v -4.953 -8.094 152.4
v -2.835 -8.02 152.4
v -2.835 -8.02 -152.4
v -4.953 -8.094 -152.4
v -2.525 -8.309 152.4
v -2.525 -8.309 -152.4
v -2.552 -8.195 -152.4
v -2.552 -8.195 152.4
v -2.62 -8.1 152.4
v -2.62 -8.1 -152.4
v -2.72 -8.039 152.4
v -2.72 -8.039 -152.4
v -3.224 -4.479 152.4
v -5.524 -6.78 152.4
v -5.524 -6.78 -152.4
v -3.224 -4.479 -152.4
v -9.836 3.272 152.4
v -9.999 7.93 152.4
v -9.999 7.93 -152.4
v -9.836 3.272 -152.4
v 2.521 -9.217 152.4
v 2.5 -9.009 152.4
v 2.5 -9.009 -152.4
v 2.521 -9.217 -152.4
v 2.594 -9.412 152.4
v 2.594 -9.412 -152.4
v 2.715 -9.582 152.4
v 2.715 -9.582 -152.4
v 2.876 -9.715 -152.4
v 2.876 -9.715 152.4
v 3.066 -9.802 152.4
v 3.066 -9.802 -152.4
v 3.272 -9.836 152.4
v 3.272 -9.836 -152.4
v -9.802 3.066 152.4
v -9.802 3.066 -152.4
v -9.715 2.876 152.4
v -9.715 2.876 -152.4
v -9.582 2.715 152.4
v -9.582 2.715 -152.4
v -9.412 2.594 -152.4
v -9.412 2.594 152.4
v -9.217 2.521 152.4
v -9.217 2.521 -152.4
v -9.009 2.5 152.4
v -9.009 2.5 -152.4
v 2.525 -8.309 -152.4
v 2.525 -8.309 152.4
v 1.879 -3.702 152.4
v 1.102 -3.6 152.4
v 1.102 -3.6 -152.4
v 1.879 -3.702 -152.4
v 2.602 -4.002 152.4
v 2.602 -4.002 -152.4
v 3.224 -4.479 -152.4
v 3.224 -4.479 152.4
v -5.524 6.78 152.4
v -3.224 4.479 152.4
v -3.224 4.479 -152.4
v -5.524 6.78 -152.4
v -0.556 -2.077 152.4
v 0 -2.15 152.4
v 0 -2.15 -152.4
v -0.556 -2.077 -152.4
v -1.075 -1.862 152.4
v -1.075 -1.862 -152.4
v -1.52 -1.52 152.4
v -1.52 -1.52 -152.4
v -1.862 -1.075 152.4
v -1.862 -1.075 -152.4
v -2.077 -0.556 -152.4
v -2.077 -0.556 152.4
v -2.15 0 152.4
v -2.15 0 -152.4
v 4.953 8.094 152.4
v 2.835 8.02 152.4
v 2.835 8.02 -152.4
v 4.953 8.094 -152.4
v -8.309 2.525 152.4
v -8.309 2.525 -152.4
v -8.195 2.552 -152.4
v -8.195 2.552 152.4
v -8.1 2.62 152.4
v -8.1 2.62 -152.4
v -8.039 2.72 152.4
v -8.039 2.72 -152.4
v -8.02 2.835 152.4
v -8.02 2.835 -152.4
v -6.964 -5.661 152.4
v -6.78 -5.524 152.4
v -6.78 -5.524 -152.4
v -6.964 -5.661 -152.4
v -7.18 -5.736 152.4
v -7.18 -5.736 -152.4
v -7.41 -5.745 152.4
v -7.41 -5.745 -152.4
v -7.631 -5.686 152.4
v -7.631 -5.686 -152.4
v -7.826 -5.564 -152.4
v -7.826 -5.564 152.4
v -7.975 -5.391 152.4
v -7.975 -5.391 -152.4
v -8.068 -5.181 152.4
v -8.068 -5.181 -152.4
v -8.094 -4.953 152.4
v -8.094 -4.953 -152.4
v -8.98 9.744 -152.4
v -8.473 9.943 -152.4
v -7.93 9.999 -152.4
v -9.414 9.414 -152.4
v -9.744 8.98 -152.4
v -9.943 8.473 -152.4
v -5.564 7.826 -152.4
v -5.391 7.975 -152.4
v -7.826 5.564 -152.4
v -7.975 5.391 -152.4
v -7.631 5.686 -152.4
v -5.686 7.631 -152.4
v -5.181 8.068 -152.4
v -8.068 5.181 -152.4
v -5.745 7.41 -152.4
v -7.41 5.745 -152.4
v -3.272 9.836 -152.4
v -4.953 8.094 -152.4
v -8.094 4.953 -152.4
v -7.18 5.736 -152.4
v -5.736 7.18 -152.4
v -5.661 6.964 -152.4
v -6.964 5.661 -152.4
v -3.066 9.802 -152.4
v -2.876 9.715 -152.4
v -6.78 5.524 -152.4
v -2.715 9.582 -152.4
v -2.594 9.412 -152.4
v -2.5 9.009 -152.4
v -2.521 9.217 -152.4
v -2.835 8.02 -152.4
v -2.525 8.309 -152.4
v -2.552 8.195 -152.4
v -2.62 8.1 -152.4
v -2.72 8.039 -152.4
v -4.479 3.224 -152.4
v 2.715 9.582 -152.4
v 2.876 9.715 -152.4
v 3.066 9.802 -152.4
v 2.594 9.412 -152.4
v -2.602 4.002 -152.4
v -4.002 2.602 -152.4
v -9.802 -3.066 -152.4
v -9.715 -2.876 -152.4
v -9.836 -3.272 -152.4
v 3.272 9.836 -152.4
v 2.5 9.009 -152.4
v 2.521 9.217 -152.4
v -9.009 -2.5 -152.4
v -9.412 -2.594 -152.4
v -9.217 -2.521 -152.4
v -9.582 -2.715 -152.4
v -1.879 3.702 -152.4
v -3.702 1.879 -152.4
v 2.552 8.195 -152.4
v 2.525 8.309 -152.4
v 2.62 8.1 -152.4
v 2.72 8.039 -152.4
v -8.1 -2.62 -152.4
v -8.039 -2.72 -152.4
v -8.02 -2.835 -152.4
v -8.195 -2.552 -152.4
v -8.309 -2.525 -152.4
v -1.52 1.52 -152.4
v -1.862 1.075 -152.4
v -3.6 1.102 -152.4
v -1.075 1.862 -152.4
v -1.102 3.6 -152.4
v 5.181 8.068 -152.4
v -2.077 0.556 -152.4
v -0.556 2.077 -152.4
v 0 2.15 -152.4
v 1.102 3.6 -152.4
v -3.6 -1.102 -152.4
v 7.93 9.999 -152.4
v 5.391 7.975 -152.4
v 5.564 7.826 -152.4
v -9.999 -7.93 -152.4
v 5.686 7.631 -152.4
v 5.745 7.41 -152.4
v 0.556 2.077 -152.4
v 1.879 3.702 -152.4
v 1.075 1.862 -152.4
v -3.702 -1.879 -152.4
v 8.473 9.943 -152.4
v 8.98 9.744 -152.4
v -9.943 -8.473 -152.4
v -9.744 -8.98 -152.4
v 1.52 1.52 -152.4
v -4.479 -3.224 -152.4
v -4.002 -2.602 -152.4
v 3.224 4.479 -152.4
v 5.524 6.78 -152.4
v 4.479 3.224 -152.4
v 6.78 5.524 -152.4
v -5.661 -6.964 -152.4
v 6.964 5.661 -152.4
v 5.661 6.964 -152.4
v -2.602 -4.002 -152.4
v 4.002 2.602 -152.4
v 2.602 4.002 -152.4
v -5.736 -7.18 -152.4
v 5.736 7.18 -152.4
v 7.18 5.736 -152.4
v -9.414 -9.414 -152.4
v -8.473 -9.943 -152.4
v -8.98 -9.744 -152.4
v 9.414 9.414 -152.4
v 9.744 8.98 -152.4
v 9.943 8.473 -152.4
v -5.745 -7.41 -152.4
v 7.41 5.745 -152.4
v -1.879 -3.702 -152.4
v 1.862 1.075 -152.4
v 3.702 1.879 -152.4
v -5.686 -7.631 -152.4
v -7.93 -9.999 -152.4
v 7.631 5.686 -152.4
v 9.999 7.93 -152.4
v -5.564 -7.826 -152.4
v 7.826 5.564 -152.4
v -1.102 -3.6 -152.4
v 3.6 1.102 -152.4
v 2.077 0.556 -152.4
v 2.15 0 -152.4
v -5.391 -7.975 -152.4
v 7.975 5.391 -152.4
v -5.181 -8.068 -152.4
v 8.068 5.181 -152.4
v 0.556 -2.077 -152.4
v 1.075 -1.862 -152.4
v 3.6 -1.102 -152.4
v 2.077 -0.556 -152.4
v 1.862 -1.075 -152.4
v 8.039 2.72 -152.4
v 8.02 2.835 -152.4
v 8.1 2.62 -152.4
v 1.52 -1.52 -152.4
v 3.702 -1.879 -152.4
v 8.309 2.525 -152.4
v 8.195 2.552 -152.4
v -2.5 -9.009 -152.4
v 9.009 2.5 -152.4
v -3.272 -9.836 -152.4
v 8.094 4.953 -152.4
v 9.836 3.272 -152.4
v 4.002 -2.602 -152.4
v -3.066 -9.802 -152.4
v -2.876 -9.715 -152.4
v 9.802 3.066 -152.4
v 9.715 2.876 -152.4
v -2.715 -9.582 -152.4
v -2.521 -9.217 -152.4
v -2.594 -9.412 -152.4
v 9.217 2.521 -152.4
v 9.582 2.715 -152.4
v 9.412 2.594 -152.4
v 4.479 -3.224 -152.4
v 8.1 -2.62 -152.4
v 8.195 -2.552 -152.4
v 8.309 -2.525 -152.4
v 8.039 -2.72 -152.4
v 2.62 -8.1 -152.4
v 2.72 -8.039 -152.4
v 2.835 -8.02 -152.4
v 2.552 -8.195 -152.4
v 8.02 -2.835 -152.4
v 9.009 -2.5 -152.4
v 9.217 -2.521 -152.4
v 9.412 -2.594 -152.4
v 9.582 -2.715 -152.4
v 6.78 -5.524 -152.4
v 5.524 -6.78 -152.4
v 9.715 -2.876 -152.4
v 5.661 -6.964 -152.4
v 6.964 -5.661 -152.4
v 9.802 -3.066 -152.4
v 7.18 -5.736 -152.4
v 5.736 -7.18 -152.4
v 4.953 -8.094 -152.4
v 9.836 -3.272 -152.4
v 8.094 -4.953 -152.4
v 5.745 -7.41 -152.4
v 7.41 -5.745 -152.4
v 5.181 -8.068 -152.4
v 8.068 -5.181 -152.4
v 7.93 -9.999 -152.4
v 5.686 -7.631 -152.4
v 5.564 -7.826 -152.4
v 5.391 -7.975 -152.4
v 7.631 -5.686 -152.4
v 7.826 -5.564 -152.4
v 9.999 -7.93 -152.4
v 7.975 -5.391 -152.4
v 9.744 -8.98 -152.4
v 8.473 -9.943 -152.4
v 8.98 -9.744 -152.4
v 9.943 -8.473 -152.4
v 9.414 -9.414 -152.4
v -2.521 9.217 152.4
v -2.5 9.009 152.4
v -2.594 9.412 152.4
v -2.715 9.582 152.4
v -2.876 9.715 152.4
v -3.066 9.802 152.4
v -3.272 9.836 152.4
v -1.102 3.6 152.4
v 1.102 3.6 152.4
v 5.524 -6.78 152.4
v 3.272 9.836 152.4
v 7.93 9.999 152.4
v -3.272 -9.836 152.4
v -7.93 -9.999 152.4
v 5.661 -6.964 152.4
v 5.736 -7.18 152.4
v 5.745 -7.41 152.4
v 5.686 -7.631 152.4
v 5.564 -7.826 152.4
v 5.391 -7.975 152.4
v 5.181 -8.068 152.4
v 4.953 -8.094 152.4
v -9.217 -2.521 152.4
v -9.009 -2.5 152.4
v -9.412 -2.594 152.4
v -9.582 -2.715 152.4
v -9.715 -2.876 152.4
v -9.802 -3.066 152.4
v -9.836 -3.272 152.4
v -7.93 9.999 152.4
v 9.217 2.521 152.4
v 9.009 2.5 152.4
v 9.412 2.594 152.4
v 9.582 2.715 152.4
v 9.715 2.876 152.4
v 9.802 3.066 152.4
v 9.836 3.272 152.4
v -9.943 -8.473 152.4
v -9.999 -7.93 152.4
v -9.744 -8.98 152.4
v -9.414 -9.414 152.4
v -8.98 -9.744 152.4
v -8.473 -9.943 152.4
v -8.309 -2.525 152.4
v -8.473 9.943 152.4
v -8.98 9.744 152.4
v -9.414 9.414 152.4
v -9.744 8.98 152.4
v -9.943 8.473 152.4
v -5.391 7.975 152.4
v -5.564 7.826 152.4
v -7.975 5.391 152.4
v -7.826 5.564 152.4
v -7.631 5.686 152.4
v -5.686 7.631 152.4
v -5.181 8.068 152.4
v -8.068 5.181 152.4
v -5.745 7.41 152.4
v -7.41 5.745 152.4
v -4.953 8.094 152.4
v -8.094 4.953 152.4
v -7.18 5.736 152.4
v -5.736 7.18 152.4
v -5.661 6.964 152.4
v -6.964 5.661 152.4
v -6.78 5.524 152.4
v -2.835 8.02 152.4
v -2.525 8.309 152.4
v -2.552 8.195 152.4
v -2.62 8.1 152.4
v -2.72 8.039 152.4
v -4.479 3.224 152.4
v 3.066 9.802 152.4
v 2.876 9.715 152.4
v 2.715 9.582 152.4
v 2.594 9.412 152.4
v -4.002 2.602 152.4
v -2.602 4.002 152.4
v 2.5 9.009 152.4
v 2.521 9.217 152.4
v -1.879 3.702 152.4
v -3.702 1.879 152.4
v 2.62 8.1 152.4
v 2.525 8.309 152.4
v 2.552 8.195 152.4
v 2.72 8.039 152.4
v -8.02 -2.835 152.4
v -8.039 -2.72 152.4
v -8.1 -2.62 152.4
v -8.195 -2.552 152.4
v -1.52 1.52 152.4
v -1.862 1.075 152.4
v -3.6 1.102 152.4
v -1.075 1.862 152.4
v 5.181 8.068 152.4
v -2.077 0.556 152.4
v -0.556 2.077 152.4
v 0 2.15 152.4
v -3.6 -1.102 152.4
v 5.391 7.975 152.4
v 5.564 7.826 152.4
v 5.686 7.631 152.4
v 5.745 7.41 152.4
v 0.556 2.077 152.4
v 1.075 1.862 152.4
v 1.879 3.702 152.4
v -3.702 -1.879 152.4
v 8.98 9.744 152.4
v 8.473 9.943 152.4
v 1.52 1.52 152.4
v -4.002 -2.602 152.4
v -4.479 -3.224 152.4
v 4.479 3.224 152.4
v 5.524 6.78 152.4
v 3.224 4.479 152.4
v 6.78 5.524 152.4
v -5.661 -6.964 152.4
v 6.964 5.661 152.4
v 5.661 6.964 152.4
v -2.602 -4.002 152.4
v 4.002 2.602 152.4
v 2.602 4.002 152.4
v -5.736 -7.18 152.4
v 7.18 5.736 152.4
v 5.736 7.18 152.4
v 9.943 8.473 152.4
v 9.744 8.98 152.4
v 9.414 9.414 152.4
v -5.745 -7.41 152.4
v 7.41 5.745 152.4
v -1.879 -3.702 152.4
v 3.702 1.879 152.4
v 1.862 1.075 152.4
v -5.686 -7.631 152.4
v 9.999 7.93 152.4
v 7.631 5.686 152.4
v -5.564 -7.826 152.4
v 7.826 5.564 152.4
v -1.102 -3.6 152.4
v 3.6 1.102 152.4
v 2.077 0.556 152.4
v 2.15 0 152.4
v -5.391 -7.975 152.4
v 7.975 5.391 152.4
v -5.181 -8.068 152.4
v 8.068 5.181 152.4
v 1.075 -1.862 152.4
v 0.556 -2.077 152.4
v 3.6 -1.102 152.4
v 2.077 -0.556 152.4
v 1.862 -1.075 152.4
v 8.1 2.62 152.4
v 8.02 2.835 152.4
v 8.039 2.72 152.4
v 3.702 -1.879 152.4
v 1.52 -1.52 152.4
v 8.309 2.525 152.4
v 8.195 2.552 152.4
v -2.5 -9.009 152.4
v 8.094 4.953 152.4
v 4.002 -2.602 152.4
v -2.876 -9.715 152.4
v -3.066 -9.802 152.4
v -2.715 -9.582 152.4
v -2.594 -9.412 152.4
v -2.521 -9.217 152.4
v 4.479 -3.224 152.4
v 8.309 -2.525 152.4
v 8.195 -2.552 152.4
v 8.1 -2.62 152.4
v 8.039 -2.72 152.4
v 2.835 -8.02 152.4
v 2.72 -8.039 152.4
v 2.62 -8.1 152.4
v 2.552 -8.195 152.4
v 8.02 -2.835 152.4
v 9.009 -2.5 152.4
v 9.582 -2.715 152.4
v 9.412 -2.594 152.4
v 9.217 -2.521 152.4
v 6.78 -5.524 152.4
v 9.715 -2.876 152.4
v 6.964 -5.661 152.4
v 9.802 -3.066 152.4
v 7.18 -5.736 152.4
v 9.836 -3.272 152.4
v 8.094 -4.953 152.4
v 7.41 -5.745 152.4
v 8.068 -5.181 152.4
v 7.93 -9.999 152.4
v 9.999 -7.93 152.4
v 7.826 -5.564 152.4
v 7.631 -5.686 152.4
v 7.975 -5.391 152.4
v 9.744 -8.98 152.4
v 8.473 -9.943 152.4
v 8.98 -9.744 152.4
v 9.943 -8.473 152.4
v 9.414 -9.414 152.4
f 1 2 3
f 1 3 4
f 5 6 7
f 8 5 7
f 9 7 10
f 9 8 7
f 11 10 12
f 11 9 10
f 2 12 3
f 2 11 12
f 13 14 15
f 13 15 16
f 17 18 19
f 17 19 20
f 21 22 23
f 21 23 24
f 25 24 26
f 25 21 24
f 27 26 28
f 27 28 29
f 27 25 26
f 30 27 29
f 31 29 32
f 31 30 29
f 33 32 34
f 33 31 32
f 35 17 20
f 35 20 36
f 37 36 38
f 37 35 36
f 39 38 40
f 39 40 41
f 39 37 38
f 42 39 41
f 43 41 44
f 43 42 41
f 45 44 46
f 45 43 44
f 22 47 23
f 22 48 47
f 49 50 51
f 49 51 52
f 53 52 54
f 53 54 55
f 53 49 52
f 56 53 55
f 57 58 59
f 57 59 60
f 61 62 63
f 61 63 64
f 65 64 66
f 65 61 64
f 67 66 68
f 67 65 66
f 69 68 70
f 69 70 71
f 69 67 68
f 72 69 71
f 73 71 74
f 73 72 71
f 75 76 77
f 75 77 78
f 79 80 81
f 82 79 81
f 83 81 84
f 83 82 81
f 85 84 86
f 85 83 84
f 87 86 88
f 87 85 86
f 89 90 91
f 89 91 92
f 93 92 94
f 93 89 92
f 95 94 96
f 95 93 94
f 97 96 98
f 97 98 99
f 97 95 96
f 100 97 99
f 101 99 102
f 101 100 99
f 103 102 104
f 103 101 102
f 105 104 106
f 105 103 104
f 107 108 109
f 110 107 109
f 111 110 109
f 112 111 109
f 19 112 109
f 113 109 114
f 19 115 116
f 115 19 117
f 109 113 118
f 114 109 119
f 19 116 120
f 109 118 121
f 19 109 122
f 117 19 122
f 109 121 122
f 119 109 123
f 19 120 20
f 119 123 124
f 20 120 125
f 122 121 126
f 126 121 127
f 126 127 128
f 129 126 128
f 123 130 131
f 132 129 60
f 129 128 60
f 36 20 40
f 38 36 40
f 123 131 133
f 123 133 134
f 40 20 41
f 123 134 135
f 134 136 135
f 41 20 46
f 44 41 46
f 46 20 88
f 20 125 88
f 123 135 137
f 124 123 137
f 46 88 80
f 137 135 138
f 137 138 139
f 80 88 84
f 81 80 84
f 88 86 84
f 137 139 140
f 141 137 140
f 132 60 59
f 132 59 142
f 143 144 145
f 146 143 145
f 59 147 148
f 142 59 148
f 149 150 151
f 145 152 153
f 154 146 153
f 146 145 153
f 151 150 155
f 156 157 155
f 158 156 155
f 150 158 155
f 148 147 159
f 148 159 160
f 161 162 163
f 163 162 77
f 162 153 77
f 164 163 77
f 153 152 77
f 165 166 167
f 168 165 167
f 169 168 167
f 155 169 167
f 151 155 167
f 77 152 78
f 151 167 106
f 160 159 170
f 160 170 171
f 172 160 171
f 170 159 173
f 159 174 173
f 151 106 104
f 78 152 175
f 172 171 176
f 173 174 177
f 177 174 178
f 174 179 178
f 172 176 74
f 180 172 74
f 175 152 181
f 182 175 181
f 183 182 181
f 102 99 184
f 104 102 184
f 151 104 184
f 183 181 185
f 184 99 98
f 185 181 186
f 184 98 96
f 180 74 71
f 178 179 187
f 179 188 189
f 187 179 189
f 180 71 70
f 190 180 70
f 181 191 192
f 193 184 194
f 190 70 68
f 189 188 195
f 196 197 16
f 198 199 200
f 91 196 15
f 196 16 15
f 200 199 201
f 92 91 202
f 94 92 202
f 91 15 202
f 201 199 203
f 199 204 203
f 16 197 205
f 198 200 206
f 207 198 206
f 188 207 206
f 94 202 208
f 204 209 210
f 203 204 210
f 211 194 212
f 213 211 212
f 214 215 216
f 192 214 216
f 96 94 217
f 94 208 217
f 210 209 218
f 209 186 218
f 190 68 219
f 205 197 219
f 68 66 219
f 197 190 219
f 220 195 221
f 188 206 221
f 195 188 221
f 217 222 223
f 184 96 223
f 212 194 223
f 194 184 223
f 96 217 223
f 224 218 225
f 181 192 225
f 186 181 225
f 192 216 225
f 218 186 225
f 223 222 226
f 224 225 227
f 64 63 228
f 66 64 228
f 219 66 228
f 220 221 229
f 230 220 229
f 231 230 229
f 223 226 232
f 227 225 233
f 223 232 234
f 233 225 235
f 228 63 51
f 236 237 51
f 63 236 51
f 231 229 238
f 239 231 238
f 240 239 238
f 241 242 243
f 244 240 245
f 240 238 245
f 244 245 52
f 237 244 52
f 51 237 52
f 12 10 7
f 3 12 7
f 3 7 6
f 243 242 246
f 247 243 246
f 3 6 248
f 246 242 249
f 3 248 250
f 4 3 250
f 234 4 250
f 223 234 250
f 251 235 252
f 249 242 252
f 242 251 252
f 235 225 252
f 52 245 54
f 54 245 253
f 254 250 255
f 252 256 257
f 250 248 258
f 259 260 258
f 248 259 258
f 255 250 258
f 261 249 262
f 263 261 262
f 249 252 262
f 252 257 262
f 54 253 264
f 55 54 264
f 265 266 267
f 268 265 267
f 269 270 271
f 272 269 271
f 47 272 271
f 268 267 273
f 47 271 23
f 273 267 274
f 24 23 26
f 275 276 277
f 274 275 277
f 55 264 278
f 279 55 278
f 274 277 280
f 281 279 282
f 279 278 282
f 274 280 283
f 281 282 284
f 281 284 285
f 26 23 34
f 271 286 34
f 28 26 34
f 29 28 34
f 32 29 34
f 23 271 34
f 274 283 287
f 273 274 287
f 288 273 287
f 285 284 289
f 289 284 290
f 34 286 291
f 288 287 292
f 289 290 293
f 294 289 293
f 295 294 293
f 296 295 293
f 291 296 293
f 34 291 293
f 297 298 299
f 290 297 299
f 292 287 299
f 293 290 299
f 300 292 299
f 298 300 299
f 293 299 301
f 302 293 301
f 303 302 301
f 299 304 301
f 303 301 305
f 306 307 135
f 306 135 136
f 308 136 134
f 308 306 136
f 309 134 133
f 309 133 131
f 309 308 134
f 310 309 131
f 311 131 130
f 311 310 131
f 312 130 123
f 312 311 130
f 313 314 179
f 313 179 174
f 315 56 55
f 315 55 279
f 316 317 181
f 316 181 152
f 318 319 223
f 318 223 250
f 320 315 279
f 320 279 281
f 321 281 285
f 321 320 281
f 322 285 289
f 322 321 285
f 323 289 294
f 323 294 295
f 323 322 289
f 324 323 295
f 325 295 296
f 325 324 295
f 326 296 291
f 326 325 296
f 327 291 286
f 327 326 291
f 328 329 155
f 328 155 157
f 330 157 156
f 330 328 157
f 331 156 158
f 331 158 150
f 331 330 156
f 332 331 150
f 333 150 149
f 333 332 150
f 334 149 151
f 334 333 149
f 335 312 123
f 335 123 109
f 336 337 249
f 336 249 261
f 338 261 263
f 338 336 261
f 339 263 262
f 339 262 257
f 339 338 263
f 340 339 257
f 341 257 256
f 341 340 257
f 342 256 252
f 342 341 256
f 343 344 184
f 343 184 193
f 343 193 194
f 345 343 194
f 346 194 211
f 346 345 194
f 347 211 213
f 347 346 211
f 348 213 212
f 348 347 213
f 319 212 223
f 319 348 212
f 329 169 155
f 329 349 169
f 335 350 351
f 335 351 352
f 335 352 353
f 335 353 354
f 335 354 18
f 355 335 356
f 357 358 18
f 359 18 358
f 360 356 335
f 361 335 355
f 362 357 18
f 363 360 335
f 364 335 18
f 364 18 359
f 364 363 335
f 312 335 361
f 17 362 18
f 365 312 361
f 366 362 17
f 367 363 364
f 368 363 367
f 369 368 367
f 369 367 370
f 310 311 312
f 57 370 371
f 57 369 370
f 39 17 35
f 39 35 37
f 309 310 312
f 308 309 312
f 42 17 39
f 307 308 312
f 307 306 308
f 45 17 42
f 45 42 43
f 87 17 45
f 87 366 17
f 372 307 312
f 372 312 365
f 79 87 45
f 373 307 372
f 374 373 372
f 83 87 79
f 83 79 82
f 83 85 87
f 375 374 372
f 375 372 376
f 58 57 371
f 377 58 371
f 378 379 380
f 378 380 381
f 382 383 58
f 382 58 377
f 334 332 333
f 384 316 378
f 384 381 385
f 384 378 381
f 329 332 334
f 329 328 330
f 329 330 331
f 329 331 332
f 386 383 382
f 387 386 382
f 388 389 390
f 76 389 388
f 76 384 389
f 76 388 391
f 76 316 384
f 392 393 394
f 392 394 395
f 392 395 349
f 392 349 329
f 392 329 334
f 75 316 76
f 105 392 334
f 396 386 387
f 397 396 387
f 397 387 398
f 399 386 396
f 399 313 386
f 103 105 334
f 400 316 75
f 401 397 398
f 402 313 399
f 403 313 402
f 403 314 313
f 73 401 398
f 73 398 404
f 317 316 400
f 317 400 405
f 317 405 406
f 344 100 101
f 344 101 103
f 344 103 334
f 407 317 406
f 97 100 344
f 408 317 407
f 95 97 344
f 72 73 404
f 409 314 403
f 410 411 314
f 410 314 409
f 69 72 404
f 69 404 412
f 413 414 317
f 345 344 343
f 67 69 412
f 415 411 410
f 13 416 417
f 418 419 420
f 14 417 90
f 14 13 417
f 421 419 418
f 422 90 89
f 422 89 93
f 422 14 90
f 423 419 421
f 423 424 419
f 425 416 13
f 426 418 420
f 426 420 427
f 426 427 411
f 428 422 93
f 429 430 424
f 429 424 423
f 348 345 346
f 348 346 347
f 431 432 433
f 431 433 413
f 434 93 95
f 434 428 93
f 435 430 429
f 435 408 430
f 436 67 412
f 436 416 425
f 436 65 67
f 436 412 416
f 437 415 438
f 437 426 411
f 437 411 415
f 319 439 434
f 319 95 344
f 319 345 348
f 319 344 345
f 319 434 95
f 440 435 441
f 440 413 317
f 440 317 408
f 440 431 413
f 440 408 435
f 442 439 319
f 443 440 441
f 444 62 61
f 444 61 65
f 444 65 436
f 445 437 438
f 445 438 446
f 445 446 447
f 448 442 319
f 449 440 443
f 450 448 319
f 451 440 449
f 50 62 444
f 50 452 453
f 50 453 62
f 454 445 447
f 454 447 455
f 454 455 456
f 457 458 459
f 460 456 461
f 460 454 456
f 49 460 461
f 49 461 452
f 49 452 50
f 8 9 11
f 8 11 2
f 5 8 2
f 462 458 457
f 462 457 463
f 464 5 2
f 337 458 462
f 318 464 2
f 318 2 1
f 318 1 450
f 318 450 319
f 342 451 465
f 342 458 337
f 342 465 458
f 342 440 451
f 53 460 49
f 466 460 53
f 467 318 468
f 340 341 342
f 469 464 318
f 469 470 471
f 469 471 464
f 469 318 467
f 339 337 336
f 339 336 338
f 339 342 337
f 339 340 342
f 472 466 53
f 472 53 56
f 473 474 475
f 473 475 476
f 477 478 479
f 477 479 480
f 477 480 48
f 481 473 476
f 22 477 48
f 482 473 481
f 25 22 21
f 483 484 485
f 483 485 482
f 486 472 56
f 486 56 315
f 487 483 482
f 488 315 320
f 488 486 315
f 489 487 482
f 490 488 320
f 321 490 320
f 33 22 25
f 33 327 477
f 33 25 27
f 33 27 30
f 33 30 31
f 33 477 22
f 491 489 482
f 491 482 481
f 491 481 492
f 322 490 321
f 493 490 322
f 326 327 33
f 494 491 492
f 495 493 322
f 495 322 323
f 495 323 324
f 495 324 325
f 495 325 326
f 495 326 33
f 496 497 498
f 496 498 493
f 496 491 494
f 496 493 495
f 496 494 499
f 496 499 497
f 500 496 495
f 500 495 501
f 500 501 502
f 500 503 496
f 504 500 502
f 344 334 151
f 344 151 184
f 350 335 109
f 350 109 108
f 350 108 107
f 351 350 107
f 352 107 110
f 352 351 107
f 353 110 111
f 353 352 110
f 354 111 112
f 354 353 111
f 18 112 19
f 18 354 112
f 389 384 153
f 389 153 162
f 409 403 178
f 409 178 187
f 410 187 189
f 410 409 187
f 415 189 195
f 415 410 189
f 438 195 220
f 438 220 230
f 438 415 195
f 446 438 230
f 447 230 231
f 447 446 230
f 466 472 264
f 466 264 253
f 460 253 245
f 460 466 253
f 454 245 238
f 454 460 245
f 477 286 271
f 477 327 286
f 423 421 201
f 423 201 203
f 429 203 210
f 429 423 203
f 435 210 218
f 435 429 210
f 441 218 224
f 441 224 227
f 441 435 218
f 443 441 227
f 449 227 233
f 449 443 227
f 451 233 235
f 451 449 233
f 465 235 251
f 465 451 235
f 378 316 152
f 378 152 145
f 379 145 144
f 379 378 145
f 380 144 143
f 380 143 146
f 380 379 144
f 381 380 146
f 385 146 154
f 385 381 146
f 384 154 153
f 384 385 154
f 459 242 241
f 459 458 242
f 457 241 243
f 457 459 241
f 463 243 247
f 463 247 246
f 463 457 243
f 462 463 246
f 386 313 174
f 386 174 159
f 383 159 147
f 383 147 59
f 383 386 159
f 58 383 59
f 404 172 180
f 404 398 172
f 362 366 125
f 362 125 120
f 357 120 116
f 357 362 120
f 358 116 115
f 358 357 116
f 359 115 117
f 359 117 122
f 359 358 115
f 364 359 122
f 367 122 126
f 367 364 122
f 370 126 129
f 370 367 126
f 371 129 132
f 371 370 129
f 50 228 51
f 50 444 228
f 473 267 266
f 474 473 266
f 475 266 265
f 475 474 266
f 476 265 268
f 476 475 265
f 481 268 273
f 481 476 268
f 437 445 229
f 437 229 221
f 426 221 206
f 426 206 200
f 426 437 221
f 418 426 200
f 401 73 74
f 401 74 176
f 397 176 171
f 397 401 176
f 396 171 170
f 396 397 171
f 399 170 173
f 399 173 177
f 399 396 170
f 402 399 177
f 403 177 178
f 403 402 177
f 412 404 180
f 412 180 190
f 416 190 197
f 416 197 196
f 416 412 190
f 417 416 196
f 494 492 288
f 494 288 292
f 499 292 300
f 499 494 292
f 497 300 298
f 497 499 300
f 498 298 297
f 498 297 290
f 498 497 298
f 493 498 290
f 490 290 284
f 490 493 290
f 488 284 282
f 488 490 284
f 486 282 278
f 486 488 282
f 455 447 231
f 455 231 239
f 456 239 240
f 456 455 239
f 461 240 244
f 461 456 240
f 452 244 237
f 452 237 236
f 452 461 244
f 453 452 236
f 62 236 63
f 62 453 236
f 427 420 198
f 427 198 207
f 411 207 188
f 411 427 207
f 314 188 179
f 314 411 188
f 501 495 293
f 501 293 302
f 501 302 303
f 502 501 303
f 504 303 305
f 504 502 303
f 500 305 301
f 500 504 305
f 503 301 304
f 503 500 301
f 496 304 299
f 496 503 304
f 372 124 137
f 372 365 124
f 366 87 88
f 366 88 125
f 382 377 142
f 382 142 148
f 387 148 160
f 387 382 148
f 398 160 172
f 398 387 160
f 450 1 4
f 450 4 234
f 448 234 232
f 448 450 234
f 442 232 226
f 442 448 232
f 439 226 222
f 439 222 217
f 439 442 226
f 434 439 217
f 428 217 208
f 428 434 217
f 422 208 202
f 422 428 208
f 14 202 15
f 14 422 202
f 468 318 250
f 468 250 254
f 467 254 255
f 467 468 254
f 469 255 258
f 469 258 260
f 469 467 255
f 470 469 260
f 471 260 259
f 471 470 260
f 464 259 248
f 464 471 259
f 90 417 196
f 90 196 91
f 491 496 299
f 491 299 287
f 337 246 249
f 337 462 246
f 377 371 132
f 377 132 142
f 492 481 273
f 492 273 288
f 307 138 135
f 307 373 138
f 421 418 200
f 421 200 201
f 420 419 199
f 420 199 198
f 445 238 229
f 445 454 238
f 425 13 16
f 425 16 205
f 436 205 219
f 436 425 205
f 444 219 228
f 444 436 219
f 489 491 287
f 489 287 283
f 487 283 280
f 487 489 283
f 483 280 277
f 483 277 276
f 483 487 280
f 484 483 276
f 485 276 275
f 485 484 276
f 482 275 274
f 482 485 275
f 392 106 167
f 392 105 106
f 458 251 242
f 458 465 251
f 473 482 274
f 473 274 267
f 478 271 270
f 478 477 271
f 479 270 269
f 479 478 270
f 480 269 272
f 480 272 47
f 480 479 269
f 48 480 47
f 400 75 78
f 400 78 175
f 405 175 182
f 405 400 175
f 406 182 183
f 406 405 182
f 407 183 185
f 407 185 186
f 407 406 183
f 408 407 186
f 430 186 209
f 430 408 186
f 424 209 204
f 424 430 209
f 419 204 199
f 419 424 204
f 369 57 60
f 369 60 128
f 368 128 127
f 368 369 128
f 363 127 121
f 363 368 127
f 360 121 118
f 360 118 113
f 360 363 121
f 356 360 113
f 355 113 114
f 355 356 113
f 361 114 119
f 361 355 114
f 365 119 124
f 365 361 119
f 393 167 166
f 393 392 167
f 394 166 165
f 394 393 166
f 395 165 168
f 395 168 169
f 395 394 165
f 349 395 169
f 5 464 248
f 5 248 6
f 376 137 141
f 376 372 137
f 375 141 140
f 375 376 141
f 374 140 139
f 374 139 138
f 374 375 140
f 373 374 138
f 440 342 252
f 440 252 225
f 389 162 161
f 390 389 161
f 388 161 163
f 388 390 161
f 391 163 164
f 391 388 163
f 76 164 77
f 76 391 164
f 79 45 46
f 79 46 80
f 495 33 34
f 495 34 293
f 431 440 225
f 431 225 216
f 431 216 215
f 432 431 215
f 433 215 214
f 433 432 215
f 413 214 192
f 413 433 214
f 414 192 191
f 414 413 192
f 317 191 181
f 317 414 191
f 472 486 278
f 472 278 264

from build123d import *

# Parameters (mm, degrees)
BOSS_EXTRUDE1_DEPTH = 152.4
CIRPATTERN1_COUNT   = 4


with BuildPart() as part:
    # Sketch3 → Boss-Extrude1 (new body, symmetric)
    with BuildSketch(Plane.XY):
        with BuildLine():
            Line((-2.524916986, 8.30911066), (-2.500487338, 9.008684239))
            ThreePointArc((-2.500487338, 9.008684239), (-2.714917039, 9.582202525), (-3.272080403, 9.836116498))
            Line((-3.272080403, 9.836116498), (-7.930201007, 9.998781654))
            ThreePointArc((-7.930201007, 9.998781654), (-9.414213562, 9.414213562), (-9.998781654, 7.930201007))
            Line((-9.998781654, 7.930201007), (-9.836116498, 3.272080403))
            ThreePointArc((-9.836116498, 3.272080403), (-9.582202525, 2.714917039), (-9.008684239, 2.500487338))
            Line((-9.008684239, 2.500487338), (-8.30911066, 2.524916986))
            ThreePointArc((-8.30911066, 2.524916986), (-8.100174399, 2.620134726), (-8.019763261, 2.835204083))
            Line((-8.019763261, 2.835204083), (-8.093719461, 4.953032548))
            ThreePointArc((-8.093719461, 4.953032548), (-7.631170264, 5.686128657), (-6.779559917, 5.52444538))
            Line((-6.779559917, 5.52444538), (-4.478679656, 3.22356512))
            ThreePointArc((-4.478679656, 3.22356512), (-3.828361402, 2.250295073), (-3.6, 1.102244776))
            Line((-3.6, 1.102244776), (-3.6, 0))
            Line((-3.6, 0), (-2.15, 0))
            ThreePointArc((-2.15, 0), (-1.52027958, 1.52027958), (0, 2.15))
            Line((0, 2.15), (0, 3.6))
            Line((0, 3.6), (-1.102244776, 3.6))
            ThreePointArc((-1.102244776, 3.6), (-2.250295073, 3.828361402), (-3.22356512, 4.478679656))
            Line((-3.22356512, 4.478679656), (-5.52444538, 6.779559917))
            ThreePointArc((-5.52444538, 6.779559917), (-5.686128657, 7.631170264), (-4.953032548, 8.093719461))
            Line((-4.953032548, 8.093719461), (-2.835204083, 8.019763261))
            ThreePointArc((-2.835204083, 8.019763261), (-2.620134726, 8.100174399), (-2.524916986, 8.30911066))
        make_face()
    boss_extrude1 = extrude(amount=BOSS_EXTRUDE1_DEPTH, both=True)

    # CirPattern1: Boss-Extrude1 ×4 about axis
    cirpattern1_axis = Axis((0, 0, 0), (0, 0, 1))
    for i in range(1, CIRPATTERN1_COUNT):
        add(boss_extrude1.rotate(cirpattern1_axis, i * 360 / CIRPATTERN1_COUNT))


solid = part.part
